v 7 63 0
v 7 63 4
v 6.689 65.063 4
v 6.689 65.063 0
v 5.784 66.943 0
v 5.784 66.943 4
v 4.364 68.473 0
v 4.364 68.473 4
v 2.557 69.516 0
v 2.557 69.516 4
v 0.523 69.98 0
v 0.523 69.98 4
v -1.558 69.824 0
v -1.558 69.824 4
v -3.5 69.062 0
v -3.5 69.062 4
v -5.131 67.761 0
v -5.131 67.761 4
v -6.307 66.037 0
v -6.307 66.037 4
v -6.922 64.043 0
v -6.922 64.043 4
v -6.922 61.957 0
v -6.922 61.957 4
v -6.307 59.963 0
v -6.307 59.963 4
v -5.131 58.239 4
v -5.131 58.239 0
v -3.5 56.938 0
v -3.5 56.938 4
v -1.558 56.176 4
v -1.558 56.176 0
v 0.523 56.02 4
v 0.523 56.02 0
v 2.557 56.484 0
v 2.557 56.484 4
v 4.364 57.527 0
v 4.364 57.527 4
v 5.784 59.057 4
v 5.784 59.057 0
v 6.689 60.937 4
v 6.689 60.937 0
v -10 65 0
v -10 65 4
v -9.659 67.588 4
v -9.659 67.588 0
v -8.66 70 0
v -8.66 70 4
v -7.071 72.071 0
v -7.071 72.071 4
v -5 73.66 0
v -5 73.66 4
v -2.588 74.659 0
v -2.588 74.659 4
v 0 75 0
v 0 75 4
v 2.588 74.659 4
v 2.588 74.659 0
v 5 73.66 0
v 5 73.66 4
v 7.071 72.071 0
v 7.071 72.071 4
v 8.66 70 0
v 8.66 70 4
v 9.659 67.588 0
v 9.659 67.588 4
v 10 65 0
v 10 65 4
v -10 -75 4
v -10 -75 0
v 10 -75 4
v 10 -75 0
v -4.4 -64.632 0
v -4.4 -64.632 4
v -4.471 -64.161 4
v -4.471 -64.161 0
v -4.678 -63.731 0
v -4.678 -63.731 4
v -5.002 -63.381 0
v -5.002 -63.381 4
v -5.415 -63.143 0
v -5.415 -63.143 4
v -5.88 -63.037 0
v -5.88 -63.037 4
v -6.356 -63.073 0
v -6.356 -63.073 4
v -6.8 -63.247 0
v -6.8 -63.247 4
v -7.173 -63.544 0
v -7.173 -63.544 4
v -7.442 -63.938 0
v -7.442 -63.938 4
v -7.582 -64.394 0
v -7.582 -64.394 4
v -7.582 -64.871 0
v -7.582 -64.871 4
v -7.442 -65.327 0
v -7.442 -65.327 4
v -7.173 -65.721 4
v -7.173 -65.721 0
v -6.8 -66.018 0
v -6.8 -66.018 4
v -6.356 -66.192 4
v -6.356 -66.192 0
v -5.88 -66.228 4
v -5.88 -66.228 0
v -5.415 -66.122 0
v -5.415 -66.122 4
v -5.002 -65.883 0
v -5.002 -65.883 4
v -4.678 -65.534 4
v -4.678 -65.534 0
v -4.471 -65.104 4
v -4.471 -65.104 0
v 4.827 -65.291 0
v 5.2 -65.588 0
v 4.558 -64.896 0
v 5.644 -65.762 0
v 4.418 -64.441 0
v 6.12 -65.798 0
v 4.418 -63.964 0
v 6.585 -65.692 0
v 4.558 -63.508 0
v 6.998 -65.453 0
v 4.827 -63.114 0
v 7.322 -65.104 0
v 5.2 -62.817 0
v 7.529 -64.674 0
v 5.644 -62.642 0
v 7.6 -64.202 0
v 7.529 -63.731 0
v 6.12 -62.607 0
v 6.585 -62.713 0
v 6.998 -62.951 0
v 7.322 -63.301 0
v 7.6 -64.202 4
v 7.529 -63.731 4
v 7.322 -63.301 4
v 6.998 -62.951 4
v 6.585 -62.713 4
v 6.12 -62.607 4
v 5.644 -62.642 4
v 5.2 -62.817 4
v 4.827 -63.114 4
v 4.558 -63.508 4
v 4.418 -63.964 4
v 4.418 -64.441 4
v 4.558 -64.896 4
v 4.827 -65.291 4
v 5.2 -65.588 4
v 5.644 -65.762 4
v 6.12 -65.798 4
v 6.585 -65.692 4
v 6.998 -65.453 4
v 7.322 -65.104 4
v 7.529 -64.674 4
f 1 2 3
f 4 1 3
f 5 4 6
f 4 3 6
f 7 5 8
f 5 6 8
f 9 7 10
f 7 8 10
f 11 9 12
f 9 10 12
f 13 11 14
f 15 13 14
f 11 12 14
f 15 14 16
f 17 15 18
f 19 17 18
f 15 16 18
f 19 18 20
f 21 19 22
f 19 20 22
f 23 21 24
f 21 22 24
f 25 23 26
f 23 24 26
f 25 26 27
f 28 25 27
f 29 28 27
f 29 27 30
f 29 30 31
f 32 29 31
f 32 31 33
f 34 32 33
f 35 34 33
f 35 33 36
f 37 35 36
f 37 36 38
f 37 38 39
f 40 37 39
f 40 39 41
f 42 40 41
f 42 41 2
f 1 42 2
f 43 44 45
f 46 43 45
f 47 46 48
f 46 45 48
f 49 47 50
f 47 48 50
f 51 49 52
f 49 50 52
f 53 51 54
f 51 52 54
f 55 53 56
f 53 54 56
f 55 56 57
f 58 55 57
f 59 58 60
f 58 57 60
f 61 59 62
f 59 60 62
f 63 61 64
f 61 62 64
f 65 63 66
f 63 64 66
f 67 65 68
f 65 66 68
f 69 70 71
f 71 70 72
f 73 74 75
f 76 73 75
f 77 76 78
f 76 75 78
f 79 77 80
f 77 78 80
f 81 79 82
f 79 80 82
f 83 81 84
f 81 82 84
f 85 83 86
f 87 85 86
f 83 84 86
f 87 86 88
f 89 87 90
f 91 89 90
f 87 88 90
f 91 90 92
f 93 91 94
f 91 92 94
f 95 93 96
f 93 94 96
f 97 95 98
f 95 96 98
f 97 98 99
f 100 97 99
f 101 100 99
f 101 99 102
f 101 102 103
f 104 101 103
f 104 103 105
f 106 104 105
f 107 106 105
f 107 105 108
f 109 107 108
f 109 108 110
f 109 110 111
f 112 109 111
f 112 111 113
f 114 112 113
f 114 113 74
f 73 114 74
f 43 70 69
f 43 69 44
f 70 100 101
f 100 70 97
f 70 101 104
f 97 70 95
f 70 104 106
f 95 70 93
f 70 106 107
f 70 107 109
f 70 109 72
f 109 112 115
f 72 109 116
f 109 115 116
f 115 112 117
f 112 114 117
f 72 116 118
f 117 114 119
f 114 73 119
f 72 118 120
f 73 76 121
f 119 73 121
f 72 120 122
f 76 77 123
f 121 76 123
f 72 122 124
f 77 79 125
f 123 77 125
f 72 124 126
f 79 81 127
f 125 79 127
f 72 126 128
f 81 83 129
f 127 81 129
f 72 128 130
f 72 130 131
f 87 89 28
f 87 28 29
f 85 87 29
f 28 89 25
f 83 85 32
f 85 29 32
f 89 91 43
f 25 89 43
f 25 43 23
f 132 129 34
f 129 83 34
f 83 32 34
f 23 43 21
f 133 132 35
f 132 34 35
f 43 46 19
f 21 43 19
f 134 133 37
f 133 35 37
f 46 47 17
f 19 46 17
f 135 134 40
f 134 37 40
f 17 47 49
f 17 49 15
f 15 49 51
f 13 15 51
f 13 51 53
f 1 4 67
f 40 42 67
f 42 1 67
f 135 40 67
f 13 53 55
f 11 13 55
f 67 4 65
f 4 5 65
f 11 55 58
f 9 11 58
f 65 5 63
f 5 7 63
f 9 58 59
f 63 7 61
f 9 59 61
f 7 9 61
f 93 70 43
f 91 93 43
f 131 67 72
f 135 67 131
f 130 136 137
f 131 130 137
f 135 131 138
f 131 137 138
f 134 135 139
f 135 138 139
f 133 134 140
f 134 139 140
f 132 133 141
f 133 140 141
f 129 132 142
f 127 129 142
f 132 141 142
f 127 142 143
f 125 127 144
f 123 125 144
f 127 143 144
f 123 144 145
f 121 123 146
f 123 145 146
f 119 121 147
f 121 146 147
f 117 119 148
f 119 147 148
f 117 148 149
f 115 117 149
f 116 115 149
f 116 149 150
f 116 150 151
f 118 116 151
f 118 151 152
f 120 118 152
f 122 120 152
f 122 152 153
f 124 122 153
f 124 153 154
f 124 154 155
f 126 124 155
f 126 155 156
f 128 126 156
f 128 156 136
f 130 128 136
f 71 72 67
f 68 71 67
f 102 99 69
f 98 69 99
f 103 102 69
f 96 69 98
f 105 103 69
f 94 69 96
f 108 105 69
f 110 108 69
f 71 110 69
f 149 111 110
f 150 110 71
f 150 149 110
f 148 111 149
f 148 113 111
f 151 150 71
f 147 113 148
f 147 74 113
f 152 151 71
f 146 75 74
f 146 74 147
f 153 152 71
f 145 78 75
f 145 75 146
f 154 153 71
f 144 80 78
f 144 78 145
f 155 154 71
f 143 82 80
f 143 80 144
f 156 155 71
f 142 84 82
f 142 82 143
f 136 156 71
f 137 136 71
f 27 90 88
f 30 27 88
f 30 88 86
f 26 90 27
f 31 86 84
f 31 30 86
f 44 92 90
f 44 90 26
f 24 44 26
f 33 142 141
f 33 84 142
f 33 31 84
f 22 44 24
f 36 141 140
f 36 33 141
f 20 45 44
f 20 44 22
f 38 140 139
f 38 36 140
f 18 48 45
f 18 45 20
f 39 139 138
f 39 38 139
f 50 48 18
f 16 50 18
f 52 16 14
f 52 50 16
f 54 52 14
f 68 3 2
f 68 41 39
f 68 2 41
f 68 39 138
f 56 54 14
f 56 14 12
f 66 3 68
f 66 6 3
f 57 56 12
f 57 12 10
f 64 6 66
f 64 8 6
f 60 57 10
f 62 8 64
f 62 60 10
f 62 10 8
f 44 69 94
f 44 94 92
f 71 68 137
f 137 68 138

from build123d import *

# Parameters (mm, degrees)
SKETCH_1_W          = 20
SKETCH_1_H          = 150
EXTRUDE_1_DEPTH     = 4
CUT_EXTRUDE_1_DEPTH = 4
SKETCH_3_R          = 7
SKETCH_3_R_2        = 1.6
CUT_EXTRUDE_2_DEPTH = 76.769386958


with BuildPart() as part:
    # 草圖1 → 填料-伸長1 (new body)
    with BuildSketch(Plane.XY):
        Rectangle(SKETCH_1_W, SKETCH_1_H)
    extrude(amount=EXTRUDE_1_DEPTH)

    # 草圖2 → 除料-伸長1 (cut)
    with BuildSketch(Plane.XY.offset(4)):
        with BuildLine():
            ThreePointArc((-10, 65), (-7.071067812, 72.071067812), (0, 75))
            Line((0, 75), (-10, 75))
            Line((-10, 75), (-10, 65))
        make_face()
        with BuildLine():
            Line((10, 75), (0, 75))
            ThreePointArc((0, 75), (7.071067812, 72.071067812), (10, 65))
            Line((10, 65), (10, 75))
        make_face()
    extrude(amount=-CUT_EXTRUDE_1_DEPTH, mode=Mode.SUBTRACT)

    # 草圖3 → 除料-伸長2 (cut, through all)
    with BuildSketch(Plane.XY.offset(4)):
        with Locations((0, 63)):
            Circle(SKETCH_3_R)
        with Locations((-6, -64.632416386)):
            Circle(SKETCH_3_R_2)
        with Locations((6, -64.202233011)):
            Circle(SKETCH_3_R_2)
    extrude(amount=-CUT_EXTRUDE_2_DEPTH, mode=Mode.SUBTRACT)


solid = part.part
